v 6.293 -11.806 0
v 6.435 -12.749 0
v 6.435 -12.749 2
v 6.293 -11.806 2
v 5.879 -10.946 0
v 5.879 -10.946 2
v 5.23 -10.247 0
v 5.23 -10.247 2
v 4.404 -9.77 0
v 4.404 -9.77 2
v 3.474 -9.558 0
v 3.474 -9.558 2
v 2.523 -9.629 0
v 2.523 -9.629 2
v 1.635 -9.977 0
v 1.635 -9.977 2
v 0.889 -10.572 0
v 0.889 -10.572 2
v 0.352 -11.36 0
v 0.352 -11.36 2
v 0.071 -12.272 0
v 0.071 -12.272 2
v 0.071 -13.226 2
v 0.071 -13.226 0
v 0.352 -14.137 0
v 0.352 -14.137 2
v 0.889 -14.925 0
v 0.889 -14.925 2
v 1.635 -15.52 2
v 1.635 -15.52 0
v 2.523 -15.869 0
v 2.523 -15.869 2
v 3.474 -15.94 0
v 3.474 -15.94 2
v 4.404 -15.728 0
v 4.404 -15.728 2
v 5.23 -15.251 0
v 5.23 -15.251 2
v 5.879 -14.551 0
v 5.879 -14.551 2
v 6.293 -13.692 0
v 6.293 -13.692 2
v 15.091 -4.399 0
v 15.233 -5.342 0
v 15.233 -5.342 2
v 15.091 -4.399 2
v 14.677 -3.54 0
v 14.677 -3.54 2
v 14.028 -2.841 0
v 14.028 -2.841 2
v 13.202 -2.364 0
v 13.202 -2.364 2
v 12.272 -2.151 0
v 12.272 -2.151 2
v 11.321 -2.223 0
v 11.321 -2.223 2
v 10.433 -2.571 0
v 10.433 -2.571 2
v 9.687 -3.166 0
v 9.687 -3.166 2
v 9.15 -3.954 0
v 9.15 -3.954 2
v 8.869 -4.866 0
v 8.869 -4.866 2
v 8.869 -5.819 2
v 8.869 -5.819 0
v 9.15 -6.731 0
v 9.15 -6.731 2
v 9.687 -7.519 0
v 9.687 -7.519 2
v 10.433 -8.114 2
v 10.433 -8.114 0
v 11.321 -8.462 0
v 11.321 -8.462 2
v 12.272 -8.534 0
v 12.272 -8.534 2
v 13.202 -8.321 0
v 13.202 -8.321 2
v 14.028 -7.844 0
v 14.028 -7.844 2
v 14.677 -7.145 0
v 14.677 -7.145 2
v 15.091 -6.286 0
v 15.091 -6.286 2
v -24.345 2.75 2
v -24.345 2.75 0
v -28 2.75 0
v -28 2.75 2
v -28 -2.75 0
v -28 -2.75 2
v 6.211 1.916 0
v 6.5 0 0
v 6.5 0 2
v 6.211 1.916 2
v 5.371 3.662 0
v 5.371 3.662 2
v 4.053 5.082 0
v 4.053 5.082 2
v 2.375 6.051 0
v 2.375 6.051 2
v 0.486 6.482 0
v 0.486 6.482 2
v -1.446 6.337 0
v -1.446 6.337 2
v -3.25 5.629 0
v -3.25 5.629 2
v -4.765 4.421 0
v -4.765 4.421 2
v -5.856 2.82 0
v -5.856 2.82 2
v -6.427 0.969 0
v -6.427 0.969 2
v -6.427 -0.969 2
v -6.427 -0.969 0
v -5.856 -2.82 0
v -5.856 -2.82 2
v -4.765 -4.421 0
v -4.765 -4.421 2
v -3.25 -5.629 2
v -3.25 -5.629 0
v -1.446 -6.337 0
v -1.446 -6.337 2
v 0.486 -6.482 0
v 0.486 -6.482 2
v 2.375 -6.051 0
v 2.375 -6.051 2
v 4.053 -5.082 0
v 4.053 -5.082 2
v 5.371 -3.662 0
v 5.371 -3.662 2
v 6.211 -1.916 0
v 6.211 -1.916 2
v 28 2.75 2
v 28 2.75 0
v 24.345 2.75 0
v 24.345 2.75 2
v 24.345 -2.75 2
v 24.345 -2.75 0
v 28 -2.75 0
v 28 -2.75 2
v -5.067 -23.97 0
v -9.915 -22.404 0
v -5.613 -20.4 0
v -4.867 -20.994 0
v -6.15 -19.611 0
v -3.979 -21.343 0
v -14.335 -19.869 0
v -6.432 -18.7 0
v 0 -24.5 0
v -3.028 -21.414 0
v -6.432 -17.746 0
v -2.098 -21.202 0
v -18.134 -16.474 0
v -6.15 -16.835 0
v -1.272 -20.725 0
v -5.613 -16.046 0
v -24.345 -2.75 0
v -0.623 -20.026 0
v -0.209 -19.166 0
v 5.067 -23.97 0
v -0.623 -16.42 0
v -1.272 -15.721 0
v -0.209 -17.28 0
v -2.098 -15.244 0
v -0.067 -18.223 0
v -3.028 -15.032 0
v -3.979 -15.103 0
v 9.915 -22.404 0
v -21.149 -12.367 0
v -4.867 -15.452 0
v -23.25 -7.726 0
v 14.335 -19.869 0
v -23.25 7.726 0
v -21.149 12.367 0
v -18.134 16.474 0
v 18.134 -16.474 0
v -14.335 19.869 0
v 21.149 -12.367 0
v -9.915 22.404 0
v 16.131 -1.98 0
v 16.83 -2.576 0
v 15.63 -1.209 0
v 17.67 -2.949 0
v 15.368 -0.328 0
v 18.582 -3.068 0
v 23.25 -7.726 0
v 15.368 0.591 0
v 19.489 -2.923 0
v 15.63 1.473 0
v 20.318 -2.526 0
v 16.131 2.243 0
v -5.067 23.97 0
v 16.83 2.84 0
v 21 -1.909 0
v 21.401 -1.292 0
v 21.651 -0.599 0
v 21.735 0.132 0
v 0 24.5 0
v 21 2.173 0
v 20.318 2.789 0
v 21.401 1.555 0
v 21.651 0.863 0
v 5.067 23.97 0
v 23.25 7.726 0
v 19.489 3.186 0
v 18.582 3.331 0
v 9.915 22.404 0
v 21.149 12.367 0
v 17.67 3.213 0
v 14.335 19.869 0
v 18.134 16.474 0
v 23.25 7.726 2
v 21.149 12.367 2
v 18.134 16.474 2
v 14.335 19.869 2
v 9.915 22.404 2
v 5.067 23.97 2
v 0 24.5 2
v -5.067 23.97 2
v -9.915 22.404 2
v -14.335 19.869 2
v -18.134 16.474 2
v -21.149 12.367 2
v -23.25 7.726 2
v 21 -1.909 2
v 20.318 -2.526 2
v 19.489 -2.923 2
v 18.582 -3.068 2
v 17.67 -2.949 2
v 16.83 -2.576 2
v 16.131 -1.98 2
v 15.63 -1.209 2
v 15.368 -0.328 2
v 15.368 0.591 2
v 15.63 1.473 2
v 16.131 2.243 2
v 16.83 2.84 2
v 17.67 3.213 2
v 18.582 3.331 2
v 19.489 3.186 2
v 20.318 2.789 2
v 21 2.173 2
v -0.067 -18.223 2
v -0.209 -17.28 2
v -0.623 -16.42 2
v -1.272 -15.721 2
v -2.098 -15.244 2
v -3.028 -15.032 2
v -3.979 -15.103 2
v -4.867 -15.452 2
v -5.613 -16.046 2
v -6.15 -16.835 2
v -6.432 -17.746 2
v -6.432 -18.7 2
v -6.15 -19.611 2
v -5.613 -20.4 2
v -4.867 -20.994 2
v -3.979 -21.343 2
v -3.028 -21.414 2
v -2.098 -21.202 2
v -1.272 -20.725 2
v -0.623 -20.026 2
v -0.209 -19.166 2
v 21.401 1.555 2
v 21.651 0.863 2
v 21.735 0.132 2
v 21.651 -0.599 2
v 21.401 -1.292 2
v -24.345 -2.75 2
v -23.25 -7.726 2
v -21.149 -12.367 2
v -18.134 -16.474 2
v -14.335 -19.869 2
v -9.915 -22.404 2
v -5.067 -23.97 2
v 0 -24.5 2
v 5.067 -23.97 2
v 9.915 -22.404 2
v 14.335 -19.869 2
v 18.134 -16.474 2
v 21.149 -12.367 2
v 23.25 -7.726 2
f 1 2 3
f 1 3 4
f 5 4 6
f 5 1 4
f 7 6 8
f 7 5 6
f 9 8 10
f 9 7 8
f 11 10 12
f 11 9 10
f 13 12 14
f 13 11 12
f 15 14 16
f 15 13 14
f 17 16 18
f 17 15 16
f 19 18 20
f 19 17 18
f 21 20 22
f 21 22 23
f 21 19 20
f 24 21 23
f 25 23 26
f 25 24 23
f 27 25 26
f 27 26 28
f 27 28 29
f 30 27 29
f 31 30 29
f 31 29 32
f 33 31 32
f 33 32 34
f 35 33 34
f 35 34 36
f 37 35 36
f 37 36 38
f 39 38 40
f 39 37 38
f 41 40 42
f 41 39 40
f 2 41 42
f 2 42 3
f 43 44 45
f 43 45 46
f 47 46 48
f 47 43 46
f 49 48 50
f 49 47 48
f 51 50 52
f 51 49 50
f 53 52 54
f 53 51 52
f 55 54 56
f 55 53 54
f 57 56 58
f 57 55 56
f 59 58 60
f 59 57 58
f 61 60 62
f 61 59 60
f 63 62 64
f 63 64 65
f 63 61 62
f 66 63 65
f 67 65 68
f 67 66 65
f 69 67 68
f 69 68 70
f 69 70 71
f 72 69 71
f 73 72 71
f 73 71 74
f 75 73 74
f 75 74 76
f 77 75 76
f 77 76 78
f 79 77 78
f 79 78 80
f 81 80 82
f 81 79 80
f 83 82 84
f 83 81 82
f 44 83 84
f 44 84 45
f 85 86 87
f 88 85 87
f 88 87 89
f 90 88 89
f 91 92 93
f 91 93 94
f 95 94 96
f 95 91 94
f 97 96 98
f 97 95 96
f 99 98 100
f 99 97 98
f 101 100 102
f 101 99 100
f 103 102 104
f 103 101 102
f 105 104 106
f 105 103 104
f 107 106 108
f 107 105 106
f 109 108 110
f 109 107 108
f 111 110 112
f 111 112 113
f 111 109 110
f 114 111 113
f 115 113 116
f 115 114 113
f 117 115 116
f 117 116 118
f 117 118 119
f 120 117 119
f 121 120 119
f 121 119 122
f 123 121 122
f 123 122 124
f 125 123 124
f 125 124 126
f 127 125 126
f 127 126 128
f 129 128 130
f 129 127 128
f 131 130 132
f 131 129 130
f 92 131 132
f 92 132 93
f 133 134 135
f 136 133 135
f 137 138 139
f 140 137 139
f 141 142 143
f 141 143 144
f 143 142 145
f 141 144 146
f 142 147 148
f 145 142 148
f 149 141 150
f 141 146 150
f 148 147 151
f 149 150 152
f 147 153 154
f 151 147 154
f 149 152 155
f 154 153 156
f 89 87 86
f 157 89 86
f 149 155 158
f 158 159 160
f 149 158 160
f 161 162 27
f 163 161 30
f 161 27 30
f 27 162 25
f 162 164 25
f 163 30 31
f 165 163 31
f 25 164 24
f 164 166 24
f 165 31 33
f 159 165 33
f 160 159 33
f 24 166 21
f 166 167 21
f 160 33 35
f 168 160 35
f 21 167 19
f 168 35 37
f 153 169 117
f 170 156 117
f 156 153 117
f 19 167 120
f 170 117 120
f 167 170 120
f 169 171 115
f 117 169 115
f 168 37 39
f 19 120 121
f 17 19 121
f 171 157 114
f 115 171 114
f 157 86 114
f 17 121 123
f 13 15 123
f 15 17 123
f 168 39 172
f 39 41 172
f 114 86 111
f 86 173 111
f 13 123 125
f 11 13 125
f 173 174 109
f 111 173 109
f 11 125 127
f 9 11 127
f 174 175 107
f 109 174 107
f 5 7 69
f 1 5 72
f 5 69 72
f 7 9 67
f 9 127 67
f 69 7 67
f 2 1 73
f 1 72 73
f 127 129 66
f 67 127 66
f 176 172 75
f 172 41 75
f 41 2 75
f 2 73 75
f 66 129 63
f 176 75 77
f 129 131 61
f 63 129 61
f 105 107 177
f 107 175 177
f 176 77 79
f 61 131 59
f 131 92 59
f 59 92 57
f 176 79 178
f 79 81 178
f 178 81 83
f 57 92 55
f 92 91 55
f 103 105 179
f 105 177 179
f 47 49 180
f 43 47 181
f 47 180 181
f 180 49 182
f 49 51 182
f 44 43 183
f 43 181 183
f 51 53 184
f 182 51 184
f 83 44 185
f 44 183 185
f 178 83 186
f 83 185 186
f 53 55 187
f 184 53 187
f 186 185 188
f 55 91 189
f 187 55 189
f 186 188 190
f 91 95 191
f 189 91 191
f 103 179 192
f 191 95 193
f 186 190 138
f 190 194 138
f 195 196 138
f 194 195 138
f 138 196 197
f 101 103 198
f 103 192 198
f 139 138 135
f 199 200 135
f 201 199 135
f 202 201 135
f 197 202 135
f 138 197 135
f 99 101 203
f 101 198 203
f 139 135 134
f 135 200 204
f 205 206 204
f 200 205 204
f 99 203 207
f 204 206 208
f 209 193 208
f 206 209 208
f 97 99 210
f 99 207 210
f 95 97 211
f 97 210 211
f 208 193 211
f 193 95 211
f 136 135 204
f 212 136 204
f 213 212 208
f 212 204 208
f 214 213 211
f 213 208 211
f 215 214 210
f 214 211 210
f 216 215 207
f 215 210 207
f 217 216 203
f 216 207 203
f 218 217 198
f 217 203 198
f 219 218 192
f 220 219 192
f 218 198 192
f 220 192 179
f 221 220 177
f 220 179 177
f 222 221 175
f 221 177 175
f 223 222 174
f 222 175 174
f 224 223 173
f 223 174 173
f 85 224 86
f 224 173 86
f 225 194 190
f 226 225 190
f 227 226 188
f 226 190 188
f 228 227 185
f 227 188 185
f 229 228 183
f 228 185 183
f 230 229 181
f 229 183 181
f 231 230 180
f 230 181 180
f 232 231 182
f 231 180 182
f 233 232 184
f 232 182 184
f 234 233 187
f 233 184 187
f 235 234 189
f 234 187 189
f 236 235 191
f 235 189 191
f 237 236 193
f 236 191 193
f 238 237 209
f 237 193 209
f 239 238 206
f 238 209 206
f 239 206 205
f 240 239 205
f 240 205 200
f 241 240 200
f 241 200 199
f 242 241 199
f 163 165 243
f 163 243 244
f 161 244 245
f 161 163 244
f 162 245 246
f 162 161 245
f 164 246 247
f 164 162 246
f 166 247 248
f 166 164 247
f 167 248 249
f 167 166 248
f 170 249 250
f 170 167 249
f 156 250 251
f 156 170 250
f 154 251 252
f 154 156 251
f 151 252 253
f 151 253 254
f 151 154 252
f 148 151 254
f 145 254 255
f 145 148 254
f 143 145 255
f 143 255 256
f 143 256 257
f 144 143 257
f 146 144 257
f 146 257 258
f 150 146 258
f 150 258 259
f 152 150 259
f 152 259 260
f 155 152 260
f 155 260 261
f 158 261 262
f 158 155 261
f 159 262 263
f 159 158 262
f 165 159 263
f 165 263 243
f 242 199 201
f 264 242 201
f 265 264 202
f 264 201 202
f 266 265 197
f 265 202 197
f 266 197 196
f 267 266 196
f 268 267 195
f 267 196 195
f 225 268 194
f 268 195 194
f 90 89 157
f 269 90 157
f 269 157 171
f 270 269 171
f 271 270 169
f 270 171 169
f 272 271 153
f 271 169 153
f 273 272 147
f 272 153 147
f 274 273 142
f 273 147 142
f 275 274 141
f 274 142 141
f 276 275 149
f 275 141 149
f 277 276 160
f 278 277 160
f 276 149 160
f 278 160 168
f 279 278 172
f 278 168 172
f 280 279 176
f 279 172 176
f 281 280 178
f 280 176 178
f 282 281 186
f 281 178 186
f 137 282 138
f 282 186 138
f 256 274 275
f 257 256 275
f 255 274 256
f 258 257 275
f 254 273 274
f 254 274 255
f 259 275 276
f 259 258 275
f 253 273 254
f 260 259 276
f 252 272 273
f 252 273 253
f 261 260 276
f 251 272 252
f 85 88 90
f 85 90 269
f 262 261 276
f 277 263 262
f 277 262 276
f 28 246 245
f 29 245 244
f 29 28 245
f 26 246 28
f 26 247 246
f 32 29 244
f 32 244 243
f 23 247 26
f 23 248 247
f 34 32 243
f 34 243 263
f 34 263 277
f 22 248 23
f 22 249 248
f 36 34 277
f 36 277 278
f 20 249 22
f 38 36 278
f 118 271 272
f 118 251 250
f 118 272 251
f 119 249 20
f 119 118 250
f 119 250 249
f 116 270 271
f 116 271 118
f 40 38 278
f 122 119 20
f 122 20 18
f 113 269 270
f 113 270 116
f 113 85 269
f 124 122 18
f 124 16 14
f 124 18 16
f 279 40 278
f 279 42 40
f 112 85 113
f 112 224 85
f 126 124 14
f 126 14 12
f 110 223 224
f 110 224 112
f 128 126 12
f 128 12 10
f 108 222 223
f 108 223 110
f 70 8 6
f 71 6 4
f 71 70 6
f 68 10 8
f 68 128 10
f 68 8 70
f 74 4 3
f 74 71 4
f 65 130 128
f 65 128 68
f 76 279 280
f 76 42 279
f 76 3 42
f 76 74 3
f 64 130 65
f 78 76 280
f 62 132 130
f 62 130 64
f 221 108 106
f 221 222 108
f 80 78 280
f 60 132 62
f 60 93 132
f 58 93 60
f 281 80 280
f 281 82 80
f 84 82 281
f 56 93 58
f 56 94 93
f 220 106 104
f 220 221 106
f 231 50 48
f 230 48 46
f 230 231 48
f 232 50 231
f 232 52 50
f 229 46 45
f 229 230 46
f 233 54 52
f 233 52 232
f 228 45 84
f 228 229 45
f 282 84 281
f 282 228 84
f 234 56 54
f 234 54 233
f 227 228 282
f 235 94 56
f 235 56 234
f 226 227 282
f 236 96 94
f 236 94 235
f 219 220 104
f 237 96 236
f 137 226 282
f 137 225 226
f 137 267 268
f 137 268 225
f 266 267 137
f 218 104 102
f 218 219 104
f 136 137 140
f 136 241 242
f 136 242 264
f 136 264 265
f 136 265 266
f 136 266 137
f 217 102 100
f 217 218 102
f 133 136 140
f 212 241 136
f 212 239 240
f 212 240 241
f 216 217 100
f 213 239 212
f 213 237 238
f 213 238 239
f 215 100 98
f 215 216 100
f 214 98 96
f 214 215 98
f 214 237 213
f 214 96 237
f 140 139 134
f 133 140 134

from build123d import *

# Parameters (mm, degrees)
F0_R     = 3.2
F0_R_2   = 6.5
F1_DEPTH = 2


# Not quite as in the source:
# - a feature names something its author has since deleted; it is built from what else it names


with BuildPart() as f1:
    # F0 (on Top) → F1 (new body)
    with BuildSketch(Plane.XY):
        with BuildLine():
            Line((21, 2.75), (24.3451740598, 2.75))
            ThreePointArc((24.3451740598, 2.75), (0, 24.5), (-24.3451740598, 2.75))
            Line((-24.3451740598, 2.75), (-21, 2.75))
            Line((-21, 2.75), (-21, -2.75))
            Line((-21, -2.75), (-24.3451740598, -2.75))
            ThreePointArc((-24.3451740598, -2.75), (0, -24.5), (24.3451740598, -2.75))
            Line((24.3451740598, -2.75), (21, -2.75))
            Line((21, -2.75), (21, -1.9091370521))
            ThreePointArc((21, -1.9091370521), (15.3353042136, 0.1317634061), (21, 2.1726638643))
            Line((21, 2.1726638643), (21, 2.75))
        make_face()
        with Locations((-3.267275868, -18.2230044156)):
            Circle(F0_R, mode=Mode.SUBTRACT)
        with Locations((3.235248016, -12.7487754162)):
            Circle(F0_R, mode=Mode.SUBTRACT)
        Circle(F0_R_2, mode=Mode.SUBTRACT)
        with Locations((12.0327803296, -5.3424655934)):
            Circle(F0_R, mode=Mode.SUBTRACT)
        with BuildLine():
            Line((-21, 2.75), (-24.3451740598, 2.75))
            ThreePointArc((-24.3451740598, 2.75), (-24.5, 0), (-24.3451740598, -2.75))
            Line((-24.3451740598, -2.75), (-21, -2.75))
            Line((-21, -2.75), (-21, 2.75))
        make_face()
        with BuildLine():
            ThreePointArc((-24.3451740598, -2.75), (-24.5, 0), (-24.3451740598, 2.75))
            Line((-24.3451740598, 2.75), (-28, 2.75))
            Line((-28, 2.75), (-28, -2.75))
            Line((-28, -2.75), (-24.3451740598, -2.75))
        make_face()
        with BuildLine():
            ThreePointArc((24.3451740598, -2.75), (24.4612628912, -1.3771774642), (24.5, 0))
            ThreePointArc((24.5, 0), (24.4612628912, 1.3771774642), (24.3451740598, 2.75))
            Line((24.3451740598, 2.75), (21, 2.75))
            Line((21, 2.75), (21, 2.1726638643))
            ThreePointArc((21, 2.1726638643), (21.5458711466, 1.2164231415), (21.7353042136, 0.1317634061))
            ThreePointArc((21.7353042136, 0.1317634061), (21.5458711466, -0.9528963294), (21, -1.9091370521))
            Line((21, -1.9091370521), (21, -2.75))
            Line((21, -2.75), (24.3451740598, -2.75))
        make_face()
        with BuildLine():
            ThreePointArc((24.3451740598, 2.75), (24.4612628912, 1.3771774642), (24.5, 0))
            ThreePointArc((24.5, 0), (24.4612628912, -1.3771774642), (24.3451740598, -2.75))
            Line((24.3451740598, -2.75), (28, -2.75))
            Line((28, -2.75), (28, 2.75))
            Line((28, 2.75), (24.3451740598, 2.75))
        make_face()
    extrude(amount=F1_DEPTH)


solid = f1.part
